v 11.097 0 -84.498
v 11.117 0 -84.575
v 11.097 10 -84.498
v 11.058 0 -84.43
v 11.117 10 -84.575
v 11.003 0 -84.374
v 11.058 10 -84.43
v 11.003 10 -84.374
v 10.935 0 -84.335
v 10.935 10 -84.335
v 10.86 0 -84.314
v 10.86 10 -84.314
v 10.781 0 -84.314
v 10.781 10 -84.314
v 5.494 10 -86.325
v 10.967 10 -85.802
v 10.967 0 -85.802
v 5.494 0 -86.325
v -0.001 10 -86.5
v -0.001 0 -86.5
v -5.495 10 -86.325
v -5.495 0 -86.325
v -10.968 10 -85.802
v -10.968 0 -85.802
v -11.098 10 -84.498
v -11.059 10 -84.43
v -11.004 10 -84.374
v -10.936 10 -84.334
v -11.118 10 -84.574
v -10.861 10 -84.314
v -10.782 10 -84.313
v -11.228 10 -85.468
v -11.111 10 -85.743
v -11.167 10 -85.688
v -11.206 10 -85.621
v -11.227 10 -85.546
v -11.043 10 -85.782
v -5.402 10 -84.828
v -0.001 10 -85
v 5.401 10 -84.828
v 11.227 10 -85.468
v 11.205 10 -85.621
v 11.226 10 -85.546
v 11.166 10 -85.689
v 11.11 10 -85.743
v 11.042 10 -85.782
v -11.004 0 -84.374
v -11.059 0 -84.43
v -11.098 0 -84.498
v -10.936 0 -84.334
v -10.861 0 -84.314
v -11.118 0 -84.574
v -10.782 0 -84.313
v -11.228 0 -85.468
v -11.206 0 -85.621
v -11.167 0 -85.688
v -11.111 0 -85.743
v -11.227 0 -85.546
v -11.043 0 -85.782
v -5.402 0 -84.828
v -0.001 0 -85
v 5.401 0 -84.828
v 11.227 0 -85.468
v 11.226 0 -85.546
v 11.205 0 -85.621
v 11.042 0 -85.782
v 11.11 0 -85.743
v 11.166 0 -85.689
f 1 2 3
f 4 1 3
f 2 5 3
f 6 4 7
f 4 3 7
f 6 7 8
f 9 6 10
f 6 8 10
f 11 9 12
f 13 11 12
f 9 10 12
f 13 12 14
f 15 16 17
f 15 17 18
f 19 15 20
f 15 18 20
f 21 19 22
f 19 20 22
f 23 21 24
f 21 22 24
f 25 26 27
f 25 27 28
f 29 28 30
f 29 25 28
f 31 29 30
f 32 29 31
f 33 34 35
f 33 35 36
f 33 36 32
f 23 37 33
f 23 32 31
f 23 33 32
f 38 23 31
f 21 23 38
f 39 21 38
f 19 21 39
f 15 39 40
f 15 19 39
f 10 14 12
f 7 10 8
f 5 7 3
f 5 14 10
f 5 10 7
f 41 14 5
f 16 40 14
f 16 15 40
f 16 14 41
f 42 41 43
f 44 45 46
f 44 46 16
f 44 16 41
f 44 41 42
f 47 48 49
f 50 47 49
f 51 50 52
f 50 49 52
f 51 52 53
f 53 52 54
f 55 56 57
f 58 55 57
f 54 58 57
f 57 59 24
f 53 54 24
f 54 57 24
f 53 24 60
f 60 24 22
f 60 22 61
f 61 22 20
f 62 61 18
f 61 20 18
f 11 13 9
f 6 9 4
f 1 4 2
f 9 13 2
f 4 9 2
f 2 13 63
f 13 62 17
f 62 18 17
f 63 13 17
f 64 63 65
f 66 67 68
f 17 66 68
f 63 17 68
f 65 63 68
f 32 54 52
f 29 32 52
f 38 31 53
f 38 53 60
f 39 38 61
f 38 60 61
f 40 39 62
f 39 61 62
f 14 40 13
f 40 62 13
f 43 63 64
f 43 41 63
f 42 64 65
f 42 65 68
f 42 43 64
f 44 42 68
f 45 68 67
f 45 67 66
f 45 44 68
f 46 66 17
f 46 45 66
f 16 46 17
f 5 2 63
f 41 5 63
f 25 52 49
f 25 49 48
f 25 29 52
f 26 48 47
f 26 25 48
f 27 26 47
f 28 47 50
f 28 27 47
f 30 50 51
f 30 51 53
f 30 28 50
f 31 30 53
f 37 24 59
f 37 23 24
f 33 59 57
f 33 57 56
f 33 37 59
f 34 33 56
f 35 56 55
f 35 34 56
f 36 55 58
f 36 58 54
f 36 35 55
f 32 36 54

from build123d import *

# Parameters (mm, degrees)
RESSALTO_EXTRUS_O2_DEPTH = 10
FILETE1_R                = 0.3


with BuildPart() as part:
    # Esboço1 → Ressalto-extrusão2 (new body)
    with BuildSketch(Plane(origin=(0, 0, 0), x_dir=(1, 0, 0), z_dir=(0, 1, 0))):
        with BuildLine():
            Line((11.080017789, 84.274748328), (11.262828374, 85.763621058))
            ThreePointArc((11.262828374, 85.763621058), (-0.000523598, 86.499999998), (-11.263866654, 85.763484701))
            Line((-11.263866654, 85.763484701), (-11.081056051, 84.274611816))
            ThreePointArc((-11.081056051, 84.274611816), (-0.000523599, 84.999999998), (11.080017789, 84.274748328))
        make_face()
    extrude(amount=RESSALTO_EXTRUS_O2_DEPTH)

    # Filete1
    filete1_edges = [part.edges().sort_by_distance(p)[0] for p in [
        (-11.081056051, 5, -84.274611816),
        (-11.263866654, 5, -85.763484701),
        (11.262828374, 5, -85.763621058),
        (11.080017789, 5, -84.274748328),
    ]]
    fillet(filete1_edges, radius=FILETE1_R)


solid = part.part
